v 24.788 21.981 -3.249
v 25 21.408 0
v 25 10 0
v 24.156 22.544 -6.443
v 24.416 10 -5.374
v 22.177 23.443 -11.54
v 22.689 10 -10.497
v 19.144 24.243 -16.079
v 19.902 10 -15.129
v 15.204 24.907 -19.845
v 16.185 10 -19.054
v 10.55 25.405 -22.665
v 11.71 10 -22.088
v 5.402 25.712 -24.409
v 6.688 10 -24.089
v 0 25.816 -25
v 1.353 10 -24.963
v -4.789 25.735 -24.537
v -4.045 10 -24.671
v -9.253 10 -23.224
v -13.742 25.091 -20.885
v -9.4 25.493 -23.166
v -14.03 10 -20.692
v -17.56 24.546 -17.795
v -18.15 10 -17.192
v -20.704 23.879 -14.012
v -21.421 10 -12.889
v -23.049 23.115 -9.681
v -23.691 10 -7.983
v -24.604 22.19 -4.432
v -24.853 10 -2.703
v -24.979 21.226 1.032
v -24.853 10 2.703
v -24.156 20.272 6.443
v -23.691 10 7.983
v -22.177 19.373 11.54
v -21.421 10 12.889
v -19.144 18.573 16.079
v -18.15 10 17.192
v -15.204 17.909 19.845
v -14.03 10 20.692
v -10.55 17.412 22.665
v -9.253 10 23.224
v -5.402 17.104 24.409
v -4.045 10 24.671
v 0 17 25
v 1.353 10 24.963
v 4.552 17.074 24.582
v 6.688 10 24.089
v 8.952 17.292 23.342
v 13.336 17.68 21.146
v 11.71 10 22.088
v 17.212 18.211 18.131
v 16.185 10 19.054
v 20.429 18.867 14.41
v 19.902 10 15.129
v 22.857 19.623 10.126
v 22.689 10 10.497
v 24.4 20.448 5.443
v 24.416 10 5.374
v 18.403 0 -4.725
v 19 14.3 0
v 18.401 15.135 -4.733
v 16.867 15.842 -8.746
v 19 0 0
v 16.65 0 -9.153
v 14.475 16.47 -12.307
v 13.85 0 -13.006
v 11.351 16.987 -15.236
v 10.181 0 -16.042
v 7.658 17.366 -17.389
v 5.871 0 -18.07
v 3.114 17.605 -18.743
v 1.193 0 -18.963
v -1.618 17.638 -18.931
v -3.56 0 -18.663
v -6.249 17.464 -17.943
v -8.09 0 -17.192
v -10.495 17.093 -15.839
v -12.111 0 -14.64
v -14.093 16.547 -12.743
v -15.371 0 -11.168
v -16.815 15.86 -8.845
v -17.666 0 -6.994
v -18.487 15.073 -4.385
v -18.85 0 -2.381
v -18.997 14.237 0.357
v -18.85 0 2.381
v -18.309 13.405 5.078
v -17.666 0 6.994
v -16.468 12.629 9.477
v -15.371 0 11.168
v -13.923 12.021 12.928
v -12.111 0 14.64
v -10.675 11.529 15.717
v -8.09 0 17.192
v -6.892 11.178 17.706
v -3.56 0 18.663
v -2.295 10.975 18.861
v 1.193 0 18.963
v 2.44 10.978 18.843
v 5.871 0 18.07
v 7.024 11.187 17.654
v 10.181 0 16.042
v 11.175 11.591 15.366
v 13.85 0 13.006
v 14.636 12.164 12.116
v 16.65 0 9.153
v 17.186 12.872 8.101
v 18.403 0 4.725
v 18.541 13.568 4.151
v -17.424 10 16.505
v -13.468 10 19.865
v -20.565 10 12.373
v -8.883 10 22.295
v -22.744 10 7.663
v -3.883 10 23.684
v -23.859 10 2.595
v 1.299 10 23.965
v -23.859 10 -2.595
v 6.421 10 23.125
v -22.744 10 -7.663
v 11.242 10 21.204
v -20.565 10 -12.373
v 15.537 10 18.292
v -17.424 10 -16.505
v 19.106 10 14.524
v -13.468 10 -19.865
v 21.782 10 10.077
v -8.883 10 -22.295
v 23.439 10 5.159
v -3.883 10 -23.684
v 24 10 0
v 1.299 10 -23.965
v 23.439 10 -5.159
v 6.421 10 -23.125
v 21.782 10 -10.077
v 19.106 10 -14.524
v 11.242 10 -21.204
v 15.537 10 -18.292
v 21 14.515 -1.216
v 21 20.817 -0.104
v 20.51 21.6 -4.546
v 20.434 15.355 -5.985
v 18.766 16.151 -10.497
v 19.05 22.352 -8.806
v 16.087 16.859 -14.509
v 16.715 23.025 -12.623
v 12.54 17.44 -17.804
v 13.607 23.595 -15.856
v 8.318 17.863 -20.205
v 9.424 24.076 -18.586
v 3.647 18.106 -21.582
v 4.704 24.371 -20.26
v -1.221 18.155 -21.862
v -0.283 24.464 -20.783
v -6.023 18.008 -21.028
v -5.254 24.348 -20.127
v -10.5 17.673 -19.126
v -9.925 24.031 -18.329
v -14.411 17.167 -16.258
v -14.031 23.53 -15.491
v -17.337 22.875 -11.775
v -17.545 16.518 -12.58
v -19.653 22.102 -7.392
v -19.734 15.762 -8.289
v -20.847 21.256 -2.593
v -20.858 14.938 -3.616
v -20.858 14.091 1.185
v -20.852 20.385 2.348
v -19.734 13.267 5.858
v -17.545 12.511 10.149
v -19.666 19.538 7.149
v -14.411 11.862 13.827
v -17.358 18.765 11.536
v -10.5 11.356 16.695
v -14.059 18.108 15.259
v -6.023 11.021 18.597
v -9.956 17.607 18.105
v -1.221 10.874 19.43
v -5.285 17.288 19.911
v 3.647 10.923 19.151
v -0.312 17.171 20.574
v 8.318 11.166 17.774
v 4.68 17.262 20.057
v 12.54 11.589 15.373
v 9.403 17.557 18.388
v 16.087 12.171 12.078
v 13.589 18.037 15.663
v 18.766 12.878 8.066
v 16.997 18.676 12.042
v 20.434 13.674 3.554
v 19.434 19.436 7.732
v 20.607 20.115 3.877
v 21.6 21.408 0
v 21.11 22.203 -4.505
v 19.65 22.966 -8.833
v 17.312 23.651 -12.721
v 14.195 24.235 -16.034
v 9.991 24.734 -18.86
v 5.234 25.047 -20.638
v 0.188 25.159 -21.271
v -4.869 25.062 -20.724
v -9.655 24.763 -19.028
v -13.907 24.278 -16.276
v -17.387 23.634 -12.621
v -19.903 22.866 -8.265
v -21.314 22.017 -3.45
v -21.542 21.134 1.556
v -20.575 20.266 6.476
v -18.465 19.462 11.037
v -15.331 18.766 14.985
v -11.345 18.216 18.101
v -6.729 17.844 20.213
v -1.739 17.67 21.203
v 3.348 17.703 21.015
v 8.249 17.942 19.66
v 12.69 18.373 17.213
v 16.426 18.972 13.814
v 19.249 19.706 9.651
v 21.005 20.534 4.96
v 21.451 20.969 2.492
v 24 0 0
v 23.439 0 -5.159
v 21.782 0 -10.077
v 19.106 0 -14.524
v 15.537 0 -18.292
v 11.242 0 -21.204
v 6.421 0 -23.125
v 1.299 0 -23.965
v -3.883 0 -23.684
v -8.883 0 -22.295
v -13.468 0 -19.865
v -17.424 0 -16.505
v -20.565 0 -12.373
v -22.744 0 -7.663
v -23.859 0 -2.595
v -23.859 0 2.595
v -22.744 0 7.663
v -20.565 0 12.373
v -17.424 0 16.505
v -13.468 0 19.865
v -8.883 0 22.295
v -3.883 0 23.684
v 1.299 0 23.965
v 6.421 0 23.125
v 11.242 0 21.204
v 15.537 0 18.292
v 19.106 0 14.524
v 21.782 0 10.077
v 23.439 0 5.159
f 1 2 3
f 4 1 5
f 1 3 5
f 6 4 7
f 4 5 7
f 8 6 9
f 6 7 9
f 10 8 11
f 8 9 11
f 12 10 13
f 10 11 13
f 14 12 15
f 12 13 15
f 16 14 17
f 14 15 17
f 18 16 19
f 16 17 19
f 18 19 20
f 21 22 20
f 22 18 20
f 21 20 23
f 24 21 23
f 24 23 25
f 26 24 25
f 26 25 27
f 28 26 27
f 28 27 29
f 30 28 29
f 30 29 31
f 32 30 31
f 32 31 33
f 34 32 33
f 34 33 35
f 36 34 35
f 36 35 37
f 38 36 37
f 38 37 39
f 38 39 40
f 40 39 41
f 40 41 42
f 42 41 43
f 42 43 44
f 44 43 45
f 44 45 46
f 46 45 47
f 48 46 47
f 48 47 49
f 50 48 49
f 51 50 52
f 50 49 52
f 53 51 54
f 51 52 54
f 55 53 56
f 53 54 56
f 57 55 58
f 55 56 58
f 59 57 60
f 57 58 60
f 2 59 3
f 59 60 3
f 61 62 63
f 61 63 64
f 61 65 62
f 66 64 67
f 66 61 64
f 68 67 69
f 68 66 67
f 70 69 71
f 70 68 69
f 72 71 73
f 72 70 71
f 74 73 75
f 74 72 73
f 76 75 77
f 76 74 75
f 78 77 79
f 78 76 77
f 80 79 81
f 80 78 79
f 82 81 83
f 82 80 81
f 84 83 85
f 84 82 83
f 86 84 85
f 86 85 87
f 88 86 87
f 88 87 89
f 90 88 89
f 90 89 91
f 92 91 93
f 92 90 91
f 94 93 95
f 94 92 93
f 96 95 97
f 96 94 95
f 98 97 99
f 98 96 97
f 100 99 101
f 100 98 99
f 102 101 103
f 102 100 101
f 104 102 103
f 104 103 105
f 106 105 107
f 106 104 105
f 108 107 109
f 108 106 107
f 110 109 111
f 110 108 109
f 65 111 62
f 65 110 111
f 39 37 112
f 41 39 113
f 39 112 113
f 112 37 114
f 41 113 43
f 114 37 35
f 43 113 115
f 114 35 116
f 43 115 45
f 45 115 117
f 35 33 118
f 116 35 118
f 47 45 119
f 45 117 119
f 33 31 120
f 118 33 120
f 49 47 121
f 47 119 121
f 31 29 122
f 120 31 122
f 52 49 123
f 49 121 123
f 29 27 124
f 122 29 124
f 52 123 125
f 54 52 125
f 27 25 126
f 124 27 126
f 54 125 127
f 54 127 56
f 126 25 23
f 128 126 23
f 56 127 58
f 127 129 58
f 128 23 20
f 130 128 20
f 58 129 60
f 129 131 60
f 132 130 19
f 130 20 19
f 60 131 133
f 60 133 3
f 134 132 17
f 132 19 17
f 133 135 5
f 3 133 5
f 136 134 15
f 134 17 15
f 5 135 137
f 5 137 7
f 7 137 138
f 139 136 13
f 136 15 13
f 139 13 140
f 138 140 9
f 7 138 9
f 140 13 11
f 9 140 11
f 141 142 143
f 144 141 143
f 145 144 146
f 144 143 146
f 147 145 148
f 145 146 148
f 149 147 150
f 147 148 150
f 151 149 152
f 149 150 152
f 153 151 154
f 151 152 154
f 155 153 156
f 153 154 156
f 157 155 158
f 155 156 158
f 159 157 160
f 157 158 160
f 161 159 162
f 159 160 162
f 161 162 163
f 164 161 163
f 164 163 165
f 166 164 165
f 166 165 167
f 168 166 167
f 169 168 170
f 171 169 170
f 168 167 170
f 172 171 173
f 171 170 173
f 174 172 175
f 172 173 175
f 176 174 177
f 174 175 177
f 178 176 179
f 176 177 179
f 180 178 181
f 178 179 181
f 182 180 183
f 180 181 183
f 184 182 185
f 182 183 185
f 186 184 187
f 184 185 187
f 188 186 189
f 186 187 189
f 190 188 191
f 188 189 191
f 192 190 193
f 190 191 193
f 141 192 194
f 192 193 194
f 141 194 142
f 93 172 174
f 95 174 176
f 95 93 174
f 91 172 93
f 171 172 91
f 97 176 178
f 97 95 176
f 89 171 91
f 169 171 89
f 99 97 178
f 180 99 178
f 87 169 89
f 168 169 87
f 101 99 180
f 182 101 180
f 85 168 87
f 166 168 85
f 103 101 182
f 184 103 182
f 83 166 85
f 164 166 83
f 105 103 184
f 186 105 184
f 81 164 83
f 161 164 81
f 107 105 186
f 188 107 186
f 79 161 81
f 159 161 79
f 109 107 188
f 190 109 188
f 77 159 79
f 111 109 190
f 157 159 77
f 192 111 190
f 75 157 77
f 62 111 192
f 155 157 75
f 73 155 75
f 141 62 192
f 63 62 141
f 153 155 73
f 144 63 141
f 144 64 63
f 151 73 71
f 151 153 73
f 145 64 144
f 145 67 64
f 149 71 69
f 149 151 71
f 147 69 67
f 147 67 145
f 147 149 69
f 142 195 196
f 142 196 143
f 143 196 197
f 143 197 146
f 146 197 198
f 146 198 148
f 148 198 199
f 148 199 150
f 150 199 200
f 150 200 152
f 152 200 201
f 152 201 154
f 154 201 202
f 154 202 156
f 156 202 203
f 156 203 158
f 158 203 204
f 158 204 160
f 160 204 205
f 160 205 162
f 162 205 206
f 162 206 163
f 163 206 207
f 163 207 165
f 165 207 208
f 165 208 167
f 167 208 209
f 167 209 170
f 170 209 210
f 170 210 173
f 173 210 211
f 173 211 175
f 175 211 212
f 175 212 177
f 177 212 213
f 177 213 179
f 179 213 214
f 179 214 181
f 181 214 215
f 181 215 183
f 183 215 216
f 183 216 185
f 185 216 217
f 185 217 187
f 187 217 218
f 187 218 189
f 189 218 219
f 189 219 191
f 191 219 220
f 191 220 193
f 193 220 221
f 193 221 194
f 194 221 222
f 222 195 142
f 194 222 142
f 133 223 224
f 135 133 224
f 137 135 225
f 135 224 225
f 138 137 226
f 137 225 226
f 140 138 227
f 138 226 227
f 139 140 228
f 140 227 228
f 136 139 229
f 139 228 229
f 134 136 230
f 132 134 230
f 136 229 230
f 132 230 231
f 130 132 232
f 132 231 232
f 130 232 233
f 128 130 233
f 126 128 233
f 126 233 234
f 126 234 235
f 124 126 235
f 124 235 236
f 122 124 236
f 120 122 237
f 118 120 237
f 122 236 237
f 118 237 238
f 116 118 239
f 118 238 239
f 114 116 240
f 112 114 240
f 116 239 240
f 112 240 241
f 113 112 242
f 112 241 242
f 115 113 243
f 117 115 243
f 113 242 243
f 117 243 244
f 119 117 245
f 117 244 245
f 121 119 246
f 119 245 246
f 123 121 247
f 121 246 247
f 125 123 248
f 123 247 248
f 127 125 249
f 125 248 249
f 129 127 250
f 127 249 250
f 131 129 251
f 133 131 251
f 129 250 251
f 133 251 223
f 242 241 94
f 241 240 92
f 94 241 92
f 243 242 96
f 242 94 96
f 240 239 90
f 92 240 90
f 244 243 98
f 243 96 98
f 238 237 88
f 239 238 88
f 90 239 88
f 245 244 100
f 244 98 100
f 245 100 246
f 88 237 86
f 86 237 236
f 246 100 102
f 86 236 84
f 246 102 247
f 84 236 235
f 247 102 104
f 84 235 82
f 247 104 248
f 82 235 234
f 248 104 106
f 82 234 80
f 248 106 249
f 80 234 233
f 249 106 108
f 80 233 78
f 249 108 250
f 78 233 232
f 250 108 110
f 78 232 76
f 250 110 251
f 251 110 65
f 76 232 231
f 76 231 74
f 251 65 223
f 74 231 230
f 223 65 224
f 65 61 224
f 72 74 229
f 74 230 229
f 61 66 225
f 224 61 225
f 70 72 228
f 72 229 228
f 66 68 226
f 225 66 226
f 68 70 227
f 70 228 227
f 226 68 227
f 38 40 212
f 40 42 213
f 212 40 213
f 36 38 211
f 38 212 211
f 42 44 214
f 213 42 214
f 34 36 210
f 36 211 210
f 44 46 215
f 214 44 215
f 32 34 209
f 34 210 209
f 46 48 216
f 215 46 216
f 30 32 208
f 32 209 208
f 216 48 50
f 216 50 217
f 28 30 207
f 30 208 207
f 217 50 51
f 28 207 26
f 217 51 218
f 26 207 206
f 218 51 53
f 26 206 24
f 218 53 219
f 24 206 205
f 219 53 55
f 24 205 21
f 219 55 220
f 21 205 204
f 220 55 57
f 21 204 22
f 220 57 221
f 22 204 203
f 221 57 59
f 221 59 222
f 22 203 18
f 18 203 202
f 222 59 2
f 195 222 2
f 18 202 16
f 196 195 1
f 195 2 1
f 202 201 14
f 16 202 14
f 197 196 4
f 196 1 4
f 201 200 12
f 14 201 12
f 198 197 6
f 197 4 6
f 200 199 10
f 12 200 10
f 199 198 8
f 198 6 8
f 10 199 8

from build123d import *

# Parameters (mm, degrees)
SKETCH_1_R          = 24
SKETCH_1_R_2        = 19
EXTRUDE_1_DEPTH     = 10
SKETCH_2_R          = 25
SKETCH_2_R_2        = 19
EXTRUDE_2_DEPTH     = 20
CUT_EXTRUDE_1_DEPTH = 31
SKETCH_4_R          = 21
CUT_EXTRUDE_2_DEPTH = 7
CHAMFER_1_SIZE      = 0.6


with BuildPart() as part:
    # 草图1 → 凸台-拉伸1 (new body)
    with BuildSketch(Plane(origin=(0, 0, 0), x_dir=(1, 0, 0), z_dir=(0, 1, 0))):
        Circle(SKETCH_1_R)
        Circle(SKETCH_1_R_2, mode=Mode.SUBTRACT)
    extrude(amount=EXTRUDE_1_DEPTH)

    # 草图2 → 凸台-拉伸2 (add)
    with BuildSketch(Plane(origin=(0, 10, 0), x_dir=(1, 0, 0), z_dir=(0, 1, 0))):
        Circle(SKETCH_2_R)
        Circle(SKETCH_2_R_2, mode=Mode.SUBTRACT)
    extrude(amount=EXTRUDE_2_DEPTH)

    # 草图3 → 切除-拉伸1 (cut, symmetric)
    with BuildSketch(Plane(origin=(0, 0, 0), x_dir=(0, 0, -1), z_dir=(1, 0, 0))):
        Polygon((-25, 17), (25, 25.816349035), (25, 47.879470908), (-25, 47.879470908), align=None)
    extrude(amount=CUT_EXTRUDE_1_DEPTH, both=True, mode=Mode.SUBTRACT)

    # 草图4 → 切除-拉伸2 (cut)
    with BuildSketch(Plane(origin=(0, 20.762639068, 3.661013458), x_dir=(1, 0, 0), z_dir=(0, 0.984807753, 0.173648178))):
        with Locations((0, 3.717490492)):
            Circle(SKETCH_4_R)
    extrude(amount=-CUT_EXTRUDE_2_DEPTH, mode=Mode.SUBTRACT)

    # 倒角1
    chamfer_1_edges = [part.edges().sort_by_distance(p)[0] for p in [
        (-21, 21.408174518, 0),
    ]]
    chamfer(chamfer_1_edges, length=CHAMFER_1_SIZE)


solid = part.part
